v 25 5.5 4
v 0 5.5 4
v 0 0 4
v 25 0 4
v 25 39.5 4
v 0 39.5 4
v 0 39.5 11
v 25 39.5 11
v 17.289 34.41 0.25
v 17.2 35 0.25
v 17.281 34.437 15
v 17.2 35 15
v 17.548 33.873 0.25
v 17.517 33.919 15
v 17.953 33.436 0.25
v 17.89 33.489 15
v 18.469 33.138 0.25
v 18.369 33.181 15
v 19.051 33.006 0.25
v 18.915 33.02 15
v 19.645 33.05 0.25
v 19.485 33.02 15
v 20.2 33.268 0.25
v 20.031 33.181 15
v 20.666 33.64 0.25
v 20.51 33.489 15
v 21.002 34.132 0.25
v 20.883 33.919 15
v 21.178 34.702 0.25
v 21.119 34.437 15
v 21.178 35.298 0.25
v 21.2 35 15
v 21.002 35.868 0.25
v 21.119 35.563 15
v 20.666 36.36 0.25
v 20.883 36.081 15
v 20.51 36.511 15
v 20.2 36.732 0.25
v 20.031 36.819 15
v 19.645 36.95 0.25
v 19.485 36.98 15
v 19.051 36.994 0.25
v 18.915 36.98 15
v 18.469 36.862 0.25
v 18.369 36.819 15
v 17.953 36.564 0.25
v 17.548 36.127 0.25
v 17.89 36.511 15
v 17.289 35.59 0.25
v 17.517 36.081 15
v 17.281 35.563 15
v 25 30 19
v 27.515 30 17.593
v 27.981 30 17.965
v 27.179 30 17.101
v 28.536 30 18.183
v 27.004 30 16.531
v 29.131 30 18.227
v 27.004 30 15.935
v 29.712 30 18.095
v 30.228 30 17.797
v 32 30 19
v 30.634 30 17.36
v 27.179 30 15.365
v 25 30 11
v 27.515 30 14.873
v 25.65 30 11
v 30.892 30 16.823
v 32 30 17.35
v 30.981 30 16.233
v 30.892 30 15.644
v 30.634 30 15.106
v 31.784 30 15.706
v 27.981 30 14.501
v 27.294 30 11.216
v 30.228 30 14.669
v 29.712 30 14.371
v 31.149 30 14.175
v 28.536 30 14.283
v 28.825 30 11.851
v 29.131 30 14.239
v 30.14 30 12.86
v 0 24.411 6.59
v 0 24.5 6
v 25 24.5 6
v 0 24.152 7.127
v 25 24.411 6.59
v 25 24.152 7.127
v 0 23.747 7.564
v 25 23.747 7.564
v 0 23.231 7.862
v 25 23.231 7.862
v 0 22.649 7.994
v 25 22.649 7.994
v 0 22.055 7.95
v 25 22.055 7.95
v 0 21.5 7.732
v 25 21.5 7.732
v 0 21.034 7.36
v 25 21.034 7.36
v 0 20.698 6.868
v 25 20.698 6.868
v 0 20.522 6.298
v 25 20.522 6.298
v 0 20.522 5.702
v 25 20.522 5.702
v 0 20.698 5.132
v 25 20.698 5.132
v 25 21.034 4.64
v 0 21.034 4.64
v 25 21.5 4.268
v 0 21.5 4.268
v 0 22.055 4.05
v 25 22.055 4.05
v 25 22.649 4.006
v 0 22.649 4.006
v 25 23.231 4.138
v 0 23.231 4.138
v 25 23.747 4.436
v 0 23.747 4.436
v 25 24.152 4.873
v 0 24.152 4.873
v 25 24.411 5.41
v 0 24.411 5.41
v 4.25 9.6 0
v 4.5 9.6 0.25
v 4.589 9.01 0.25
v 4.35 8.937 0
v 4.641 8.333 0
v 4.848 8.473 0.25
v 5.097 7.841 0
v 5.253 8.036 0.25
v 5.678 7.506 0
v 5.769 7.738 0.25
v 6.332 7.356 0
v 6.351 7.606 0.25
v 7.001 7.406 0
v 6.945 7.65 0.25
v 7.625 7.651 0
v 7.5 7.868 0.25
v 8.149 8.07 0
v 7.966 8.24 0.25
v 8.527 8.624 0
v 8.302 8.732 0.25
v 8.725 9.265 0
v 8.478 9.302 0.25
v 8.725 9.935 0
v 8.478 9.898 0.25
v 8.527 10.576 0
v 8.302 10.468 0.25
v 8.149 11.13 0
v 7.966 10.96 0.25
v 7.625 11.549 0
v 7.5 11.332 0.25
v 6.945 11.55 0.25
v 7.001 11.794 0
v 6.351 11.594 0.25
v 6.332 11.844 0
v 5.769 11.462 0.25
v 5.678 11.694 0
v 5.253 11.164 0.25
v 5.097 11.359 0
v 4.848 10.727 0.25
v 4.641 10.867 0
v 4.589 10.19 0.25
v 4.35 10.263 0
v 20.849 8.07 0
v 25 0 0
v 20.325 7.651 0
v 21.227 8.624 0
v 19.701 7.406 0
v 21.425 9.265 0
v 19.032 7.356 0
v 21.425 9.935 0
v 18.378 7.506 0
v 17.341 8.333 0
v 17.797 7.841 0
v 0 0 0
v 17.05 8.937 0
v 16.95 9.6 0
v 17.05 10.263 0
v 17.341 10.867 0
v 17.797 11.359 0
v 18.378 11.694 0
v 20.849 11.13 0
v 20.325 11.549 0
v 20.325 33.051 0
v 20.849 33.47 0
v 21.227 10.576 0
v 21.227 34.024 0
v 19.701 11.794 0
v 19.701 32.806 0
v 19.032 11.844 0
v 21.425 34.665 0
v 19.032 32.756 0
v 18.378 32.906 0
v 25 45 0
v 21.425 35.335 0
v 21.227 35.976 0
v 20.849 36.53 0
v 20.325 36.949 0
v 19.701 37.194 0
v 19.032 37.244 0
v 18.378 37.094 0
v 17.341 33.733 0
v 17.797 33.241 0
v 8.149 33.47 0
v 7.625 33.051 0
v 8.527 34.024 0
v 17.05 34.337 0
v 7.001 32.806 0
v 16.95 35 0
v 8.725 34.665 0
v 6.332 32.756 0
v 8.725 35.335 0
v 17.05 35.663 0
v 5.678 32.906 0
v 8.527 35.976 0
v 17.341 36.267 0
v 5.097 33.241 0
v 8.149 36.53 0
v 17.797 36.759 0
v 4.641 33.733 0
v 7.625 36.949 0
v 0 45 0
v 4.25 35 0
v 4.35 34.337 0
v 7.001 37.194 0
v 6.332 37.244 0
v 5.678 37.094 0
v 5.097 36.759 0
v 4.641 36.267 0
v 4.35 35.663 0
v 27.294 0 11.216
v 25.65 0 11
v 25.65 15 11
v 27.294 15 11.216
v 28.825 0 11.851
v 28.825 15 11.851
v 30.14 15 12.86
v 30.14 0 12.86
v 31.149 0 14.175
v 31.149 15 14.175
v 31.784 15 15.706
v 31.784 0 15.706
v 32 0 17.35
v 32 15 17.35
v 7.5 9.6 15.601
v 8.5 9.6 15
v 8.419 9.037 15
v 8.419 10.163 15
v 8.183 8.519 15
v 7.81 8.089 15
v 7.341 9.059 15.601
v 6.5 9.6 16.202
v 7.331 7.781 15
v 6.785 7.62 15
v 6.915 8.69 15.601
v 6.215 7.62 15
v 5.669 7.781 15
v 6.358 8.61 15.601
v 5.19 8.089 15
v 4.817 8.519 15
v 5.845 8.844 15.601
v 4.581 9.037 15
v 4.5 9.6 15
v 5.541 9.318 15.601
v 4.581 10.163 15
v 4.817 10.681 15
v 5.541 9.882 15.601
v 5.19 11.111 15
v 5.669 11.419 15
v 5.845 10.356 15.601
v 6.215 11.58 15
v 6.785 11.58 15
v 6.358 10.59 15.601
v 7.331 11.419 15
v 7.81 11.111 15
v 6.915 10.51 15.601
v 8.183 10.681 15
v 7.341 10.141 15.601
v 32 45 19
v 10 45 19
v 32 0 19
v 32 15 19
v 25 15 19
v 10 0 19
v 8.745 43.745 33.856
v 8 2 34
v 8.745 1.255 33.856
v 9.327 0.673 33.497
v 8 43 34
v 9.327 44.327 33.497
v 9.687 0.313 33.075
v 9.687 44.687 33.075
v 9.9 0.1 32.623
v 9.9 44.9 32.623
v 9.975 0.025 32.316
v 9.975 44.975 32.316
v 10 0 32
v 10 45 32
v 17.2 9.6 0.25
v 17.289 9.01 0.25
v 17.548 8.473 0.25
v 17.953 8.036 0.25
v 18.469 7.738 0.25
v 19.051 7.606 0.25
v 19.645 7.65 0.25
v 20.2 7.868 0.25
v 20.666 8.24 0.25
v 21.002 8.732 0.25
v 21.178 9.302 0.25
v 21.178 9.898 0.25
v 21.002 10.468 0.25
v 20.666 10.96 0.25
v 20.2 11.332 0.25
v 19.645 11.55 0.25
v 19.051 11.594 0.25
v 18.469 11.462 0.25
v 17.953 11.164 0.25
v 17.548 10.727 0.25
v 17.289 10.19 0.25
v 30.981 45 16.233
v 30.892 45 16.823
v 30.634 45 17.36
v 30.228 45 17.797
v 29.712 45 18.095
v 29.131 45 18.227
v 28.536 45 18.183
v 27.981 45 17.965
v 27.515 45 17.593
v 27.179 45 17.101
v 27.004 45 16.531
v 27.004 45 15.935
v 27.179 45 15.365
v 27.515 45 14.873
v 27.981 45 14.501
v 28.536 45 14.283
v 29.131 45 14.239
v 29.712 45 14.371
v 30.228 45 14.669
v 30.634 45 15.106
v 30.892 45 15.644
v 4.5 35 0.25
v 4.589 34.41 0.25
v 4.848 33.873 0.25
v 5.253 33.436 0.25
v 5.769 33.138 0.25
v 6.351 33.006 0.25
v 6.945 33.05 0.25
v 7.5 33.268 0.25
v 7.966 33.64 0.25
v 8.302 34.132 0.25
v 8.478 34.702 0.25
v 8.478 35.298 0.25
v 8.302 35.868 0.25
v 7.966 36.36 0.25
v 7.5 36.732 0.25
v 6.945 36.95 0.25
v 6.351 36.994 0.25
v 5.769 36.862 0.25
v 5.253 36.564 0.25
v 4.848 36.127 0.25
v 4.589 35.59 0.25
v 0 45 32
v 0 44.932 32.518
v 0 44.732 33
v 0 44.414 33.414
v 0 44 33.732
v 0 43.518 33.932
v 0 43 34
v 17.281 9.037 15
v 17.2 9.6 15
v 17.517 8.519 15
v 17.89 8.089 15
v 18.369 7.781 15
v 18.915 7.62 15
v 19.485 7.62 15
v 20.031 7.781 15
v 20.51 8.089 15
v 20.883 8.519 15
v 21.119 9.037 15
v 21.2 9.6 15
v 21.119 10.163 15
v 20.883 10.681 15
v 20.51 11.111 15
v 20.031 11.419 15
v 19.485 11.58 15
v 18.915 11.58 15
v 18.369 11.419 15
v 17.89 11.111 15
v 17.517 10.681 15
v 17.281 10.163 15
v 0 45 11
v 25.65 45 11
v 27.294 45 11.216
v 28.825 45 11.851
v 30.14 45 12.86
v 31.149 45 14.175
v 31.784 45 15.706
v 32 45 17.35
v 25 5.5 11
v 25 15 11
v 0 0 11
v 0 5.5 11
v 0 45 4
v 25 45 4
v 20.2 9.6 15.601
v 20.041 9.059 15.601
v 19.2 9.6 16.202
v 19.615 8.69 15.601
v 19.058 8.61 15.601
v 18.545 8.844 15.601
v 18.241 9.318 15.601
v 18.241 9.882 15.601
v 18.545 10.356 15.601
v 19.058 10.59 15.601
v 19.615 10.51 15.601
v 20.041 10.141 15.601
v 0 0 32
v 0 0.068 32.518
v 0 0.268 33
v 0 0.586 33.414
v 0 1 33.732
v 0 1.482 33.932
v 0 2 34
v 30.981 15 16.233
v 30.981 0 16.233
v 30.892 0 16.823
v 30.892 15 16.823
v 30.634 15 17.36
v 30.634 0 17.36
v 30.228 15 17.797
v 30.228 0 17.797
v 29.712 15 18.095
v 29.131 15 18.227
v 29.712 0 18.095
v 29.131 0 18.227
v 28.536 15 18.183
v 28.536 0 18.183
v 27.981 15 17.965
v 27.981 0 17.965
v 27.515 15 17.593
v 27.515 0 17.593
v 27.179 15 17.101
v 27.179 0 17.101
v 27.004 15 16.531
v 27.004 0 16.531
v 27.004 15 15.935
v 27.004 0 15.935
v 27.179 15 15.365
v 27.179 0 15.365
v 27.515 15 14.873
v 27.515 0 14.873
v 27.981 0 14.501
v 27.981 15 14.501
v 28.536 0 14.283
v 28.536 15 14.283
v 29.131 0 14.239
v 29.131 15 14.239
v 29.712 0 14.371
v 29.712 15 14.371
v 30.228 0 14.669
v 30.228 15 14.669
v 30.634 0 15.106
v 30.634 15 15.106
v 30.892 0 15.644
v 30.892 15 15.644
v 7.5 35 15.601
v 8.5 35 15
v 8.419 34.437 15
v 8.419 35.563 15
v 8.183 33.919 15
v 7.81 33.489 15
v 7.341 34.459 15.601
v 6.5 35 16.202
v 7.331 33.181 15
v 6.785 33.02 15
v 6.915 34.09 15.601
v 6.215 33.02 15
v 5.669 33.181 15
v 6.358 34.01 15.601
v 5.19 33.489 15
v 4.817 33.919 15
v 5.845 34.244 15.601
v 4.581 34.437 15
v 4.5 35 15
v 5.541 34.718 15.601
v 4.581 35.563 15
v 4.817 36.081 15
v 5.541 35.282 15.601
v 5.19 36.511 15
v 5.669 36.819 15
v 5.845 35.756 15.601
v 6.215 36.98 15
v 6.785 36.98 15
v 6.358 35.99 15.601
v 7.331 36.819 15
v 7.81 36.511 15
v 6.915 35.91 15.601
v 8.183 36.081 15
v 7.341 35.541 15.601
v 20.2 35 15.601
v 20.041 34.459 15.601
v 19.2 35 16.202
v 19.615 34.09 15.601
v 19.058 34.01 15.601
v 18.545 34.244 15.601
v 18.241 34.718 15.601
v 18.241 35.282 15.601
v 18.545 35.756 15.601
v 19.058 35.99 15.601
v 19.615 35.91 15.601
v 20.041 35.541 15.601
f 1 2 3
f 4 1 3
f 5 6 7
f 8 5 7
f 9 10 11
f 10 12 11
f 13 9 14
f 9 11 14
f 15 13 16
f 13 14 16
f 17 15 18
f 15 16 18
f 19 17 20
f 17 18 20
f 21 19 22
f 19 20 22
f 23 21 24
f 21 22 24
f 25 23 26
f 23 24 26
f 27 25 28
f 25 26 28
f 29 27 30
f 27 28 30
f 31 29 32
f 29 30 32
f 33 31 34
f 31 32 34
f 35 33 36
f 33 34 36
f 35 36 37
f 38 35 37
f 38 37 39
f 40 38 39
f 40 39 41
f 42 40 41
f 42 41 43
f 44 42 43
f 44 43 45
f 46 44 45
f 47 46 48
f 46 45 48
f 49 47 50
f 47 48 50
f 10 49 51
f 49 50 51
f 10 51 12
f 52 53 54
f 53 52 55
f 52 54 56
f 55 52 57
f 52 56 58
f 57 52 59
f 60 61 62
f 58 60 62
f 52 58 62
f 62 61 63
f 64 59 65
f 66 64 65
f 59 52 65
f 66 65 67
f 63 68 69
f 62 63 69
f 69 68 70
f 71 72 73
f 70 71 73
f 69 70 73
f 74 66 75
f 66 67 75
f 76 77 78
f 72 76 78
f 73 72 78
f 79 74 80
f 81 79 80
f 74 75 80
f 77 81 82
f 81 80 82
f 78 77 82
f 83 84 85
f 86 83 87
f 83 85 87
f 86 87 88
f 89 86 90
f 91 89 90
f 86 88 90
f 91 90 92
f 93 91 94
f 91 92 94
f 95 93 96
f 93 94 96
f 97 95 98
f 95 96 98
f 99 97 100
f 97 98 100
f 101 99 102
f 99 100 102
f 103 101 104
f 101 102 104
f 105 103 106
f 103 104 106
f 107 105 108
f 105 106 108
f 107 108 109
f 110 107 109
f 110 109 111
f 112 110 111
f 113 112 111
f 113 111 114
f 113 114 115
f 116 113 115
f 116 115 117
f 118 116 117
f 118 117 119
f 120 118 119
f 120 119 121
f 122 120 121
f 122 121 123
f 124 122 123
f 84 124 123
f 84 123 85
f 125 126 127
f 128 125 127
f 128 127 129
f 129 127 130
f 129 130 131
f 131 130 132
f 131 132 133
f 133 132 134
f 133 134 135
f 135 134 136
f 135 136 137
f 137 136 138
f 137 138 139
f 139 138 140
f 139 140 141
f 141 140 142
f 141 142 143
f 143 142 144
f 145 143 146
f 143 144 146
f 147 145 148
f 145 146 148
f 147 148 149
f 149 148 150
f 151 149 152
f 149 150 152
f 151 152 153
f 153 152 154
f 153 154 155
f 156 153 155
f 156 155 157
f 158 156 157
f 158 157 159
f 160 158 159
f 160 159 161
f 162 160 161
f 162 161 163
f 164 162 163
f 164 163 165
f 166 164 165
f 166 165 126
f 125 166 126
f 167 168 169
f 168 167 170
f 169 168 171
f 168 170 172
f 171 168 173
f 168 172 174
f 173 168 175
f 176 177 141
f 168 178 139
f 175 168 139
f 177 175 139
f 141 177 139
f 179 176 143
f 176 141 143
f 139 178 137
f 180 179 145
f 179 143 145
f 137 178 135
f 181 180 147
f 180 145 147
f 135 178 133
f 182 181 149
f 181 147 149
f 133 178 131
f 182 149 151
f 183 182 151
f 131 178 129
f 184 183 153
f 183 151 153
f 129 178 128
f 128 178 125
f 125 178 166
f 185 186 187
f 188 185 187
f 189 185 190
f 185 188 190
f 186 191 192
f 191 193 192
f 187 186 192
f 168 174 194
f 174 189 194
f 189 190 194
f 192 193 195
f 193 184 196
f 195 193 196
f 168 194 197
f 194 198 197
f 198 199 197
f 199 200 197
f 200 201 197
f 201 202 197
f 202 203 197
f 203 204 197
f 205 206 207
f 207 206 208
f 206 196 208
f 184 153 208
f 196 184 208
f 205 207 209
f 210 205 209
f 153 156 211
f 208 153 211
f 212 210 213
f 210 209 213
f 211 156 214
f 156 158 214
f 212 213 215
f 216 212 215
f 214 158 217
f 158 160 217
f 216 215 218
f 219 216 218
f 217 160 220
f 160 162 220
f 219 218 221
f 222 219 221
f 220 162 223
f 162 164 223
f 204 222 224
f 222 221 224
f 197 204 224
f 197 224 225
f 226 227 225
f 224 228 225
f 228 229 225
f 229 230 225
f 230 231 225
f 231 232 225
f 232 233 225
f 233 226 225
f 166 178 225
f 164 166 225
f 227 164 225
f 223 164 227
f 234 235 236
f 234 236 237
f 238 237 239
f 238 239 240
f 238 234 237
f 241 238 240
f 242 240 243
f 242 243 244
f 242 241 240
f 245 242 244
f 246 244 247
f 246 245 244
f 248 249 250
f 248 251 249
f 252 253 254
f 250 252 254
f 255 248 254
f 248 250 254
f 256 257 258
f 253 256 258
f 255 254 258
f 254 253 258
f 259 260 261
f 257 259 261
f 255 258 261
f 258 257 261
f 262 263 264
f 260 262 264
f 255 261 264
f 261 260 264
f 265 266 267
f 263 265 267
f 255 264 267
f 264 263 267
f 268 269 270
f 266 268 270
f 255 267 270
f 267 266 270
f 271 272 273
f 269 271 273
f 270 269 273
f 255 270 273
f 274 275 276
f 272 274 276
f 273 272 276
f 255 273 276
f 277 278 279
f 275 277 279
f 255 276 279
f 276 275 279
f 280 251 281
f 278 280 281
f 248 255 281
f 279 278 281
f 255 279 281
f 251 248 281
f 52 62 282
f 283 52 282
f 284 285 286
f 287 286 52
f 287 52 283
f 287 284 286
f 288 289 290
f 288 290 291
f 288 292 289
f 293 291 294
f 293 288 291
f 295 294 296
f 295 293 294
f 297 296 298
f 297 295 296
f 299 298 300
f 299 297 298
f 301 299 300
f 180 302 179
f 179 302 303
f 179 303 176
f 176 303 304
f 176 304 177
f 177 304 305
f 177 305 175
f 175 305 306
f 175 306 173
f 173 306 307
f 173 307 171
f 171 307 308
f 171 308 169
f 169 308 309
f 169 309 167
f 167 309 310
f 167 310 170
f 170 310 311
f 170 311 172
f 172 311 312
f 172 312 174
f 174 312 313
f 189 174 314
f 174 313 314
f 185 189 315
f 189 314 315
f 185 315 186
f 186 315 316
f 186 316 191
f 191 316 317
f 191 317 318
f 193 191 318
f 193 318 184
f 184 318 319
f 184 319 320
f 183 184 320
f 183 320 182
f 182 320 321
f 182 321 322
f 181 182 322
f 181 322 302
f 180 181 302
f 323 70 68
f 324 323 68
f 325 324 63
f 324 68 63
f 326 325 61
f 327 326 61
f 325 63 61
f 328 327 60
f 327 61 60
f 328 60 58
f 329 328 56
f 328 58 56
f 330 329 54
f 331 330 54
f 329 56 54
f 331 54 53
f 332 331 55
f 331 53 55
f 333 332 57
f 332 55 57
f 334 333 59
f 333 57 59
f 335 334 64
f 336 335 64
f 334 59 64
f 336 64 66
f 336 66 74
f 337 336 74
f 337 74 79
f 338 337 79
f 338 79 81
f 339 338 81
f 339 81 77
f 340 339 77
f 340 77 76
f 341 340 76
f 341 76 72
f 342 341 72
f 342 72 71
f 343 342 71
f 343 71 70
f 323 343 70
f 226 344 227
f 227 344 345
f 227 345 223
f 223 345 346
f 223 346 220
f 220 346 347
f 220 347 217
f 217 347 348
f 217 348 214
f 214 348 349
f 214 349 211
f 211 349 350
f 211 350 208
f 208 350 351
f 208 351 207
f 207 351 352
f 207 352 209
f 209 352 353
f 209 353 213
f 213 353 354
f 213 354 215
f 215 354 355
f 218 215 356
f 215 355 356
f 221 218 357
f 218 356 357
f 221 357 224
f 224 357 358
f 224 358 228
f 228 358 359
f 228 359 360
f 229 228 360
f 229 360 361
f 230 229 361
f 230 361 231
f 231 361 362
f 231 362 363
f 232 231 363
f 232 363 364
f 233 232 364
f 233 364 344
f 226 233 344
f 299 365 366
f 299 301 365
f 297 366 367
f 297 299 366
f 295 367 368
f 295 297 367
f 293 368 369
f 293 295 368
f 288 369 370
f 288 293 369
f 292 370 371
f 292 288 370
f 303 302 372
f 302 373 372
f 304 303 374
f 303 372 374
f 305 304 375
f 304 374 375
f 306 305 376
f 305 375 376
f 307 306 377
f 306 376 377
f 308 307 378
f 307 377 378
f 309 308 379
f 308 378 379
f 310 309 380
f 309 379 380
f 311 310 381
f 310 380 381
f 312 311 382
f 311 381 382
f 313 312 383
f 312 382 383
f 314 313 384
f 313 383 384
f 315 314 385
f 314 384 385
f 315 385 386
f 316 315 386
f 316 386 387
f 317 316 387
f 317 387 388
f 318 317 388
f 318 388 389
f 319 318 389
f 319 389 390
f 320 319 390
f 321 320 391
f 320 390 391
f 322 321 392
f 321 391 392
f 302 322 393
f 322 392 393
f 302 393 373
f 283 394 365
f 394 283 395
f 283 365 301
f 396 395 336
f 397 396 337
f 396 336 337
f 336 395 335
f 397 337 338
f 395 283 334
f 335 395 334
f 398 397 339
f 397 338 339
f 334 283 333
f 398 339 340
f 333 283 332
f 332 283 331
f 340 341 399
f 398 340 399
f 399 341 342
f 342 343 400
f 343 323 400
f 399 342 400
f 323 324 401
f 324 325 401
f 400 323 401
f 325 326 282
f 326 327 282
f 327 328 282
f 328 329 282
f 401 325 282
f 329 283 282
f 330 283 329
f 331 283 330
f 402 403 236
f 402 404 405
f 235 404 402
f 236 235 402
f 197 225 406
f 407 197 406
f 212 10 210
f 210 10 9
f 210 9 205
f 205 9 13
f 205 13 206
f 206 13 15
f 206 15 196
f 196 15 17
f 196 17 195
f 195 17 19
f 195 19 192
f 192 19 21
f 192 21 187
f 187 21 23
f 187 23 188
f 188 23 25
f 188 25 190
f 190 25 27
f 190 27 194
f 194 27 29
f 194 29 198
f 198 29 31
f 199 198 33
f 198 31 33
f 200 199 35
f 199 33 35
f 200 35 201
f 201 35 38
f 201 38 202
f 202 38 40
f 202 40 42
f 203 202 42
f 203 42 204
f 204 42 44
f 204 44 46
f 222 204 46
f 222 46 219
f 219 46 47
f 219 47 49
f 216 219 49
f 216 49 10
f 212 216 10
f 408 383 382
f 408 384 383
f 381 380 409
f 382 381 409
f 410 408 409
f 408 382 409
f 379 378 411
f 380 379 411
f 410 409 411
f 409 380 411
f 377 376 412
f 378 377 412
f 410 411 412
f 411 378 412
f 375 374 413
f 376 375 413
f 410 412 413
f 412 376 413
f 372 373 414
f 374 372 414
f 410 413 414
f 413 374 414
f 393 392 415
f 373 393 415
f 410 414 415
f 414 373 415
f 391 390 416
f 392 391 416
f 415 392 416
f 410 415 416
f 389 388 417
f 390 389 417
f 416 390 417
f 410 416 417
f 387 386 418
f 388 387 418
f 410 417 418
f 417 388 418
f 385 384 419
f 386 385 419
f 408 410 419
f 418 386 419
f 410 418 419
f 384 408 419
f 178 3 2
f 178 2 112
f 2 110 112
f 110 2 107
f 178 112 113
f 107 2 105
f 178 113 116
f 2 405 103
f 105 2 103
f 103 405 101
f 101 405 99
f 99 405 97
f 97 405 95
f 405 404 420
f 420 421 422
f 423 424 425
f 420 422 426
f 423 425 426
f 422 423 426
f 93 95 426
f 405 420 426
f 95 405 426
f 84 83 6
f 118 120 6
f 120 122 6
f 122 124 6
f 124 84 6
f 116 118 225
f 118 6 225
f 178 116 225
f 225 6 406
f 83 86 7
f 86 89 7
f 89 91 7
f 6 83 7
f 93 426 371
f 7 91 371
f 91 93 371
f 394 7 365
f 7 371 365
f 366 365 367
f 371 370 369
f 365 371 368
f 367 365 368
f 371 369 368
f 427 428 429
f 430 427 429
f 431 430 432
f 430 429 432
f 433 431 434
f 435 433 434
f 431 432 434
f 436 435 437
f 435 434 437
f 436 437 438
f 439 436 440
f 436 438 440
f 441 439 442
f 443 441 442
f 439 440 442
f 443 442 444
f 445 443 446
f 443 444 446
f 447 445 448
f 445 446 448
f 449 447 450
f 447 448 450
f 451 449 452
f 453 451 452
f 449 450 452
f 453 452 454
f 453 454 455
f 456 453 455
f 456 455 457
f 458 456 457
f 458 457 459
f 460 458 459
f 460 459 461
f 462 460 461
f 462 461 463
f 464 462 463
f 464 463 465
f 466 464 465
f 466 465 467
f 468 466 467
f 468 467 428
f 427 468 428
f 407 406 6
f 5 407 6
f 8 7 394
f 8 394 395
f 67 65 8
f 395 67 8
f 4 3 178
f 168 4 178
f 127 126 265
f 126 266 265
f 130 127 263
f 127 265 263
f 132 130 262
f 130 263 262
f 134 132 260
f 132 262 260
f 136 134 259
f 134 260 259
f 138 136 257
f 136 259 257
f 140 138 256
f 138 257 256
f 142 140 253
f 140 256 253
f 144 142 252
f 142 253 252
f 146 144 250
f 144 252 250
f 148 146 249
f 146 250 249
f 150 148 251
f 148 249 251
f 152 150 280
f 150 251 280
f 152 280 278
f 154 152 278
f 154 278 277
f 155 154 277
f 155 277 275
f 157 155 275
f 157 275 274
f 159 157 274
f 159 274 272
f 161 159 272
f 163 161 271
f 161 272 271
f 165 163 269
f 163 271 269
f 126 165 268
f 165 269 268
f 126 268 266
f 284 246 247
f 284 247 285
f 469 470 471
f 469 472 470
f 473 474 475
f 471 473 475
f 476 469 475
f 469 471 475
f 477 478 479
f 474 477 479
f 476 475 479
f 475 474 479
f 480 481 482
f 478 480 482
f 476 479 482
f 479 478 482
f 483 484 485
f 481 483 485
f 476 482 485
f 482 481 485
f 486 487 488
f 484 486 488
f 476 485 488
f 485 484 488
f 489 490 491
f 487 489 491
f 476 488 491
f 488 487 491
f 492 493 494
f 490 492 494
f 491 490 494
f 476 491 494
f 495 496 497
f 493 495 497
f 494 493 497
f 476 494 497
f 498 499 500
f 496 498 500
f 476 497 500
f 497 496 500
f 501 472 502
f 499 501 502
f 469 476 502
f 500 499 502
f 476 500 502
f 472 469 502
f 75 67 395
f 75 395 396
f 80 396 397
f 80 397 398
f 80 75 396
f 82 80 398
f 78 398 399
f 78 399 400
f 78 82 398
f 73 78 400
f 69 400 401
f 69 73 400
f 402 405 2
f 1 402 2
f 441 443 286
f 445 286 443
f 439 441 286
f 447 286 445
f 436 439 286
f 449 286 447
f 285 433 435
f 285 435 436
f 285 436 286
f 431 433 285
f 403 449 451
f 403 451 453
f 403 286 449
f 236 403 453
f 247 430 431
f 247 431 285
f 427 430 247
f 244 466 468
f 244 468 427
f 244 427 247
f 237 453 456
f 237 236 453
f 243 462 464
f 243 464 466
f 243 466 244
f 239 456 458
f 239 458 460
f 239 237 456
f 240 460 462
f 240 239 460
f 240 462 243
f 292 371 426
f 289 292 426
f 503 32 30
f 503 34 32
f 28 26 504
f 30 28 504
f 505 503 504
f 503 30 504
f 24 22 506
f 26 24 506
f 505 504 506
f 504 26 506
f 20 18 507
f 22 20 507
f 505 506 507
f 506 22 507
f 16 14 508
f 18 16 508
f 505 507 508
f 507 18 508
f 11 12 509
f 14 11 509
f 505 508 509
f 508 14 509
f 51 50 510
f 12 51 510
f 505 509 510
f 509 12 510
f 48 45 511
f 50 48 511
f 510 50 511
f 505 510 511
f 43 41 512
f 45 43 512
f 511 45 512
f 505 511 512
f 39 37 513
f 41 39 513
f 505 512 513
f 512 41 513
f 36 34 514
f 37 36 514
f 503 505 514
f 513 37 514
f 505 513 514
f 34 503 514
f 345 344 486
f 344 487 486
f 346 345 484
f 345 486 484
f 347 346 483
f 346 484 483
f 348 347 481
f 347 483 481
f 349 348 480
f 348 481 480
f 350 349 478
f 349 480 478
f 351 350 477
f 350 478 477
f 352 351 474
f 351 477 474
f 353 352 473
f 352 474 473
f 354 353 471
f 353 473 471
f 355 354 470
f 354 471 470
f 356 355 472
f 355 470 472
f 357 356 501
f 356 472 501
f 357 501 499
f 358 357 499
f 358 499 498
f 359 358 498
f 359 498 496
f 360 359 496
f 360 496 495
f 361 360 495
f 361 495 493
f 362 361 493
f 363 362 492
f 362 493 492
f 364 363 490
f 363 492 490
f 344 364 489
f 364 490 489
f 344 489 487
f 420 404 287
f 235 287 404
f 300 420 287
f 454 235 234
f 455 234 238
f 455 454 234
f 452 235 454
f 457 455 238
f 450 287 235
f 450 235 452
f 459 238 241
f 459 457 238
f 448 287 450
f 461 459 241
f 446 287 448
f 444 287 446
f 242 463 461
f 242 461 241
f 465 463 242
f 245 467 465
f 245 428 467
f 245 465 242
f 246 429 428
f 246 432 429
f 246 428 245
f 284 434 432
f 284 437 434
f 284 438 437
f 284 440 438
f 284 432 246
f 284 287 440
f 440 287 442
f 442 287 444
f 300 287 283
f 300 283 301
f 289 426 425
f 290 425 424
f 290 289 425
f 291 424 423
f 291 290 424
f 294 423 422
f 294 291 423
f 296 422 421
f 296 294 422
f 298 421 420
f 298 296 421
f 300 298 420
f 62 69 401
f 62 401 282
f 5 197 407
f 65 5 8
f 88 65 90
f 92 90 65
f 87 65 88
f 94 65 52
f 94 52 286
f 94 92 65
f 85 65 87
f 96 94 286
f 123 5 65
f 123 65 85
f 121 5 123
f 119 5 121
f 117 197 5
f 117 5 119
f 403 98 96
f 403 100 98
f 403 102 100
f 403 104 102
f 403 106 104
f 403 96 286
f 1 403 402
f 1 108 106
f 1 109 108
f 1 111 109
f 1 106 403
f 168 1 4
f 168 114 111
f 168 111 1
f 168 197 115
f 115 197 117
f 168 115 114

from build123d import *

# Parameters (mm, degrees)
F1_DEPTH       = 25
F2_W           = 15
F2_H           = 15
F3_DEPTH       = 45
F4_R           = 2
F6_D           = 4
F8_D           = 4
F8_DEPTH       = 15
F8_CSINK_D     = 4.5
F8_CSINK_ANGLE = 90
F8_TIP         = 1.2017212381
F9_R           = 2
F10_DEPTH      = 45
F11_W          = 13.5859974714
F11_H          = 15
F12_DEPTH      = 25.4


with BuildPart() as f1:
    # F0 (on Right) → F1 (new body)
    with BuildSketch(Plane.YZ):
        Polygon((0, 4), (0, 0), (45, 0), (45, 4), (39.5, 4), (39.5, 11), (45, 11), (45, 34), (0, 34), (0, 11), (5.5, 11), (5.5, 4), align=None)
    extrude(amount=F1_DEPTH)

    # F2 (on face) → F3 (cut, through all)
    with BuildSketch(Plane.XZ):
        with Locations((17.5, 26.5)):
            Rectangle(F2_W, F2_H)
    extrude(amount=-F3_DEPTH, mode=Mode.SUBTRACT)

    # F4
    f4_edges = [f1.edges().sort_by_distance(p)[0] for p in [
        (10, 22.5, 34),
        (5, 0, 34),
        (5, 45, 34),
    ]]
    fillet(f4_edges, radius=F4_R)

    # F6 (through all)
    with Locations(Plane(origin=(0, 0, 0), x_dir=(0, -1, 0), z_dir=(-1, 0, 0))):
        with Locations((-22.5, 6)):
            Hole(F6_D / 2)

    # F8
    with Locations(Plane(origin=(0, 0, 0), x_dir=(1, 0, 0), z_dir=(0, 0, -1))):
        with Locations((19.2, -9.6), (6.5, -9.6), (6.5, -35), (19.2, -35)):
            CounterSinkHole(F8_D / 2, F8_CSINK_D / 2, depth=F8_DEPTH, counter_sink_angle=F8_CSINK_ANGLE)
            with Locations((0, 0, -(F8_DEPTH + F8_TIP / 2))):  # 118° drill point
                Cone(0, F8_D / 2, F8_TIP, mode=Mode.SUBTRACT)

    # F9 (on face) → F10 (join, through all)
    with BuildSketch(Plane.XZ):
        with BuildLine():
            Line((32, 19), (25, 19))
            Line((25, 19), (25, 11))
            Line((25, 11), (25.65, 11))
            ThreePointArc((25.65, 11), (30.1401280605, 12.8598719395), (32, 17.35))
            Line((32, 17.35), (32, 19))
        make_face()
        with Locations((28.9811789989, 16.233060509)):
            Circle(F9_R, mode=Mode.SUBTRACT)
    extrude(amount=-F10_DEPTH)

    # F11 (on face) → F12 (cut)
    with BuildSketch(Plane(origin=(0, 0, 0), x_dir=(1, 0, 0), z_dir=(0, 0, -1))):
        with Locations((31.7929987357, -22.5)):
            Rectangle(F11_W, F11_H)
    extrude(amount=-F12_DEPTH, mode=Mode.SUBTRACT)


solid = f1.part
